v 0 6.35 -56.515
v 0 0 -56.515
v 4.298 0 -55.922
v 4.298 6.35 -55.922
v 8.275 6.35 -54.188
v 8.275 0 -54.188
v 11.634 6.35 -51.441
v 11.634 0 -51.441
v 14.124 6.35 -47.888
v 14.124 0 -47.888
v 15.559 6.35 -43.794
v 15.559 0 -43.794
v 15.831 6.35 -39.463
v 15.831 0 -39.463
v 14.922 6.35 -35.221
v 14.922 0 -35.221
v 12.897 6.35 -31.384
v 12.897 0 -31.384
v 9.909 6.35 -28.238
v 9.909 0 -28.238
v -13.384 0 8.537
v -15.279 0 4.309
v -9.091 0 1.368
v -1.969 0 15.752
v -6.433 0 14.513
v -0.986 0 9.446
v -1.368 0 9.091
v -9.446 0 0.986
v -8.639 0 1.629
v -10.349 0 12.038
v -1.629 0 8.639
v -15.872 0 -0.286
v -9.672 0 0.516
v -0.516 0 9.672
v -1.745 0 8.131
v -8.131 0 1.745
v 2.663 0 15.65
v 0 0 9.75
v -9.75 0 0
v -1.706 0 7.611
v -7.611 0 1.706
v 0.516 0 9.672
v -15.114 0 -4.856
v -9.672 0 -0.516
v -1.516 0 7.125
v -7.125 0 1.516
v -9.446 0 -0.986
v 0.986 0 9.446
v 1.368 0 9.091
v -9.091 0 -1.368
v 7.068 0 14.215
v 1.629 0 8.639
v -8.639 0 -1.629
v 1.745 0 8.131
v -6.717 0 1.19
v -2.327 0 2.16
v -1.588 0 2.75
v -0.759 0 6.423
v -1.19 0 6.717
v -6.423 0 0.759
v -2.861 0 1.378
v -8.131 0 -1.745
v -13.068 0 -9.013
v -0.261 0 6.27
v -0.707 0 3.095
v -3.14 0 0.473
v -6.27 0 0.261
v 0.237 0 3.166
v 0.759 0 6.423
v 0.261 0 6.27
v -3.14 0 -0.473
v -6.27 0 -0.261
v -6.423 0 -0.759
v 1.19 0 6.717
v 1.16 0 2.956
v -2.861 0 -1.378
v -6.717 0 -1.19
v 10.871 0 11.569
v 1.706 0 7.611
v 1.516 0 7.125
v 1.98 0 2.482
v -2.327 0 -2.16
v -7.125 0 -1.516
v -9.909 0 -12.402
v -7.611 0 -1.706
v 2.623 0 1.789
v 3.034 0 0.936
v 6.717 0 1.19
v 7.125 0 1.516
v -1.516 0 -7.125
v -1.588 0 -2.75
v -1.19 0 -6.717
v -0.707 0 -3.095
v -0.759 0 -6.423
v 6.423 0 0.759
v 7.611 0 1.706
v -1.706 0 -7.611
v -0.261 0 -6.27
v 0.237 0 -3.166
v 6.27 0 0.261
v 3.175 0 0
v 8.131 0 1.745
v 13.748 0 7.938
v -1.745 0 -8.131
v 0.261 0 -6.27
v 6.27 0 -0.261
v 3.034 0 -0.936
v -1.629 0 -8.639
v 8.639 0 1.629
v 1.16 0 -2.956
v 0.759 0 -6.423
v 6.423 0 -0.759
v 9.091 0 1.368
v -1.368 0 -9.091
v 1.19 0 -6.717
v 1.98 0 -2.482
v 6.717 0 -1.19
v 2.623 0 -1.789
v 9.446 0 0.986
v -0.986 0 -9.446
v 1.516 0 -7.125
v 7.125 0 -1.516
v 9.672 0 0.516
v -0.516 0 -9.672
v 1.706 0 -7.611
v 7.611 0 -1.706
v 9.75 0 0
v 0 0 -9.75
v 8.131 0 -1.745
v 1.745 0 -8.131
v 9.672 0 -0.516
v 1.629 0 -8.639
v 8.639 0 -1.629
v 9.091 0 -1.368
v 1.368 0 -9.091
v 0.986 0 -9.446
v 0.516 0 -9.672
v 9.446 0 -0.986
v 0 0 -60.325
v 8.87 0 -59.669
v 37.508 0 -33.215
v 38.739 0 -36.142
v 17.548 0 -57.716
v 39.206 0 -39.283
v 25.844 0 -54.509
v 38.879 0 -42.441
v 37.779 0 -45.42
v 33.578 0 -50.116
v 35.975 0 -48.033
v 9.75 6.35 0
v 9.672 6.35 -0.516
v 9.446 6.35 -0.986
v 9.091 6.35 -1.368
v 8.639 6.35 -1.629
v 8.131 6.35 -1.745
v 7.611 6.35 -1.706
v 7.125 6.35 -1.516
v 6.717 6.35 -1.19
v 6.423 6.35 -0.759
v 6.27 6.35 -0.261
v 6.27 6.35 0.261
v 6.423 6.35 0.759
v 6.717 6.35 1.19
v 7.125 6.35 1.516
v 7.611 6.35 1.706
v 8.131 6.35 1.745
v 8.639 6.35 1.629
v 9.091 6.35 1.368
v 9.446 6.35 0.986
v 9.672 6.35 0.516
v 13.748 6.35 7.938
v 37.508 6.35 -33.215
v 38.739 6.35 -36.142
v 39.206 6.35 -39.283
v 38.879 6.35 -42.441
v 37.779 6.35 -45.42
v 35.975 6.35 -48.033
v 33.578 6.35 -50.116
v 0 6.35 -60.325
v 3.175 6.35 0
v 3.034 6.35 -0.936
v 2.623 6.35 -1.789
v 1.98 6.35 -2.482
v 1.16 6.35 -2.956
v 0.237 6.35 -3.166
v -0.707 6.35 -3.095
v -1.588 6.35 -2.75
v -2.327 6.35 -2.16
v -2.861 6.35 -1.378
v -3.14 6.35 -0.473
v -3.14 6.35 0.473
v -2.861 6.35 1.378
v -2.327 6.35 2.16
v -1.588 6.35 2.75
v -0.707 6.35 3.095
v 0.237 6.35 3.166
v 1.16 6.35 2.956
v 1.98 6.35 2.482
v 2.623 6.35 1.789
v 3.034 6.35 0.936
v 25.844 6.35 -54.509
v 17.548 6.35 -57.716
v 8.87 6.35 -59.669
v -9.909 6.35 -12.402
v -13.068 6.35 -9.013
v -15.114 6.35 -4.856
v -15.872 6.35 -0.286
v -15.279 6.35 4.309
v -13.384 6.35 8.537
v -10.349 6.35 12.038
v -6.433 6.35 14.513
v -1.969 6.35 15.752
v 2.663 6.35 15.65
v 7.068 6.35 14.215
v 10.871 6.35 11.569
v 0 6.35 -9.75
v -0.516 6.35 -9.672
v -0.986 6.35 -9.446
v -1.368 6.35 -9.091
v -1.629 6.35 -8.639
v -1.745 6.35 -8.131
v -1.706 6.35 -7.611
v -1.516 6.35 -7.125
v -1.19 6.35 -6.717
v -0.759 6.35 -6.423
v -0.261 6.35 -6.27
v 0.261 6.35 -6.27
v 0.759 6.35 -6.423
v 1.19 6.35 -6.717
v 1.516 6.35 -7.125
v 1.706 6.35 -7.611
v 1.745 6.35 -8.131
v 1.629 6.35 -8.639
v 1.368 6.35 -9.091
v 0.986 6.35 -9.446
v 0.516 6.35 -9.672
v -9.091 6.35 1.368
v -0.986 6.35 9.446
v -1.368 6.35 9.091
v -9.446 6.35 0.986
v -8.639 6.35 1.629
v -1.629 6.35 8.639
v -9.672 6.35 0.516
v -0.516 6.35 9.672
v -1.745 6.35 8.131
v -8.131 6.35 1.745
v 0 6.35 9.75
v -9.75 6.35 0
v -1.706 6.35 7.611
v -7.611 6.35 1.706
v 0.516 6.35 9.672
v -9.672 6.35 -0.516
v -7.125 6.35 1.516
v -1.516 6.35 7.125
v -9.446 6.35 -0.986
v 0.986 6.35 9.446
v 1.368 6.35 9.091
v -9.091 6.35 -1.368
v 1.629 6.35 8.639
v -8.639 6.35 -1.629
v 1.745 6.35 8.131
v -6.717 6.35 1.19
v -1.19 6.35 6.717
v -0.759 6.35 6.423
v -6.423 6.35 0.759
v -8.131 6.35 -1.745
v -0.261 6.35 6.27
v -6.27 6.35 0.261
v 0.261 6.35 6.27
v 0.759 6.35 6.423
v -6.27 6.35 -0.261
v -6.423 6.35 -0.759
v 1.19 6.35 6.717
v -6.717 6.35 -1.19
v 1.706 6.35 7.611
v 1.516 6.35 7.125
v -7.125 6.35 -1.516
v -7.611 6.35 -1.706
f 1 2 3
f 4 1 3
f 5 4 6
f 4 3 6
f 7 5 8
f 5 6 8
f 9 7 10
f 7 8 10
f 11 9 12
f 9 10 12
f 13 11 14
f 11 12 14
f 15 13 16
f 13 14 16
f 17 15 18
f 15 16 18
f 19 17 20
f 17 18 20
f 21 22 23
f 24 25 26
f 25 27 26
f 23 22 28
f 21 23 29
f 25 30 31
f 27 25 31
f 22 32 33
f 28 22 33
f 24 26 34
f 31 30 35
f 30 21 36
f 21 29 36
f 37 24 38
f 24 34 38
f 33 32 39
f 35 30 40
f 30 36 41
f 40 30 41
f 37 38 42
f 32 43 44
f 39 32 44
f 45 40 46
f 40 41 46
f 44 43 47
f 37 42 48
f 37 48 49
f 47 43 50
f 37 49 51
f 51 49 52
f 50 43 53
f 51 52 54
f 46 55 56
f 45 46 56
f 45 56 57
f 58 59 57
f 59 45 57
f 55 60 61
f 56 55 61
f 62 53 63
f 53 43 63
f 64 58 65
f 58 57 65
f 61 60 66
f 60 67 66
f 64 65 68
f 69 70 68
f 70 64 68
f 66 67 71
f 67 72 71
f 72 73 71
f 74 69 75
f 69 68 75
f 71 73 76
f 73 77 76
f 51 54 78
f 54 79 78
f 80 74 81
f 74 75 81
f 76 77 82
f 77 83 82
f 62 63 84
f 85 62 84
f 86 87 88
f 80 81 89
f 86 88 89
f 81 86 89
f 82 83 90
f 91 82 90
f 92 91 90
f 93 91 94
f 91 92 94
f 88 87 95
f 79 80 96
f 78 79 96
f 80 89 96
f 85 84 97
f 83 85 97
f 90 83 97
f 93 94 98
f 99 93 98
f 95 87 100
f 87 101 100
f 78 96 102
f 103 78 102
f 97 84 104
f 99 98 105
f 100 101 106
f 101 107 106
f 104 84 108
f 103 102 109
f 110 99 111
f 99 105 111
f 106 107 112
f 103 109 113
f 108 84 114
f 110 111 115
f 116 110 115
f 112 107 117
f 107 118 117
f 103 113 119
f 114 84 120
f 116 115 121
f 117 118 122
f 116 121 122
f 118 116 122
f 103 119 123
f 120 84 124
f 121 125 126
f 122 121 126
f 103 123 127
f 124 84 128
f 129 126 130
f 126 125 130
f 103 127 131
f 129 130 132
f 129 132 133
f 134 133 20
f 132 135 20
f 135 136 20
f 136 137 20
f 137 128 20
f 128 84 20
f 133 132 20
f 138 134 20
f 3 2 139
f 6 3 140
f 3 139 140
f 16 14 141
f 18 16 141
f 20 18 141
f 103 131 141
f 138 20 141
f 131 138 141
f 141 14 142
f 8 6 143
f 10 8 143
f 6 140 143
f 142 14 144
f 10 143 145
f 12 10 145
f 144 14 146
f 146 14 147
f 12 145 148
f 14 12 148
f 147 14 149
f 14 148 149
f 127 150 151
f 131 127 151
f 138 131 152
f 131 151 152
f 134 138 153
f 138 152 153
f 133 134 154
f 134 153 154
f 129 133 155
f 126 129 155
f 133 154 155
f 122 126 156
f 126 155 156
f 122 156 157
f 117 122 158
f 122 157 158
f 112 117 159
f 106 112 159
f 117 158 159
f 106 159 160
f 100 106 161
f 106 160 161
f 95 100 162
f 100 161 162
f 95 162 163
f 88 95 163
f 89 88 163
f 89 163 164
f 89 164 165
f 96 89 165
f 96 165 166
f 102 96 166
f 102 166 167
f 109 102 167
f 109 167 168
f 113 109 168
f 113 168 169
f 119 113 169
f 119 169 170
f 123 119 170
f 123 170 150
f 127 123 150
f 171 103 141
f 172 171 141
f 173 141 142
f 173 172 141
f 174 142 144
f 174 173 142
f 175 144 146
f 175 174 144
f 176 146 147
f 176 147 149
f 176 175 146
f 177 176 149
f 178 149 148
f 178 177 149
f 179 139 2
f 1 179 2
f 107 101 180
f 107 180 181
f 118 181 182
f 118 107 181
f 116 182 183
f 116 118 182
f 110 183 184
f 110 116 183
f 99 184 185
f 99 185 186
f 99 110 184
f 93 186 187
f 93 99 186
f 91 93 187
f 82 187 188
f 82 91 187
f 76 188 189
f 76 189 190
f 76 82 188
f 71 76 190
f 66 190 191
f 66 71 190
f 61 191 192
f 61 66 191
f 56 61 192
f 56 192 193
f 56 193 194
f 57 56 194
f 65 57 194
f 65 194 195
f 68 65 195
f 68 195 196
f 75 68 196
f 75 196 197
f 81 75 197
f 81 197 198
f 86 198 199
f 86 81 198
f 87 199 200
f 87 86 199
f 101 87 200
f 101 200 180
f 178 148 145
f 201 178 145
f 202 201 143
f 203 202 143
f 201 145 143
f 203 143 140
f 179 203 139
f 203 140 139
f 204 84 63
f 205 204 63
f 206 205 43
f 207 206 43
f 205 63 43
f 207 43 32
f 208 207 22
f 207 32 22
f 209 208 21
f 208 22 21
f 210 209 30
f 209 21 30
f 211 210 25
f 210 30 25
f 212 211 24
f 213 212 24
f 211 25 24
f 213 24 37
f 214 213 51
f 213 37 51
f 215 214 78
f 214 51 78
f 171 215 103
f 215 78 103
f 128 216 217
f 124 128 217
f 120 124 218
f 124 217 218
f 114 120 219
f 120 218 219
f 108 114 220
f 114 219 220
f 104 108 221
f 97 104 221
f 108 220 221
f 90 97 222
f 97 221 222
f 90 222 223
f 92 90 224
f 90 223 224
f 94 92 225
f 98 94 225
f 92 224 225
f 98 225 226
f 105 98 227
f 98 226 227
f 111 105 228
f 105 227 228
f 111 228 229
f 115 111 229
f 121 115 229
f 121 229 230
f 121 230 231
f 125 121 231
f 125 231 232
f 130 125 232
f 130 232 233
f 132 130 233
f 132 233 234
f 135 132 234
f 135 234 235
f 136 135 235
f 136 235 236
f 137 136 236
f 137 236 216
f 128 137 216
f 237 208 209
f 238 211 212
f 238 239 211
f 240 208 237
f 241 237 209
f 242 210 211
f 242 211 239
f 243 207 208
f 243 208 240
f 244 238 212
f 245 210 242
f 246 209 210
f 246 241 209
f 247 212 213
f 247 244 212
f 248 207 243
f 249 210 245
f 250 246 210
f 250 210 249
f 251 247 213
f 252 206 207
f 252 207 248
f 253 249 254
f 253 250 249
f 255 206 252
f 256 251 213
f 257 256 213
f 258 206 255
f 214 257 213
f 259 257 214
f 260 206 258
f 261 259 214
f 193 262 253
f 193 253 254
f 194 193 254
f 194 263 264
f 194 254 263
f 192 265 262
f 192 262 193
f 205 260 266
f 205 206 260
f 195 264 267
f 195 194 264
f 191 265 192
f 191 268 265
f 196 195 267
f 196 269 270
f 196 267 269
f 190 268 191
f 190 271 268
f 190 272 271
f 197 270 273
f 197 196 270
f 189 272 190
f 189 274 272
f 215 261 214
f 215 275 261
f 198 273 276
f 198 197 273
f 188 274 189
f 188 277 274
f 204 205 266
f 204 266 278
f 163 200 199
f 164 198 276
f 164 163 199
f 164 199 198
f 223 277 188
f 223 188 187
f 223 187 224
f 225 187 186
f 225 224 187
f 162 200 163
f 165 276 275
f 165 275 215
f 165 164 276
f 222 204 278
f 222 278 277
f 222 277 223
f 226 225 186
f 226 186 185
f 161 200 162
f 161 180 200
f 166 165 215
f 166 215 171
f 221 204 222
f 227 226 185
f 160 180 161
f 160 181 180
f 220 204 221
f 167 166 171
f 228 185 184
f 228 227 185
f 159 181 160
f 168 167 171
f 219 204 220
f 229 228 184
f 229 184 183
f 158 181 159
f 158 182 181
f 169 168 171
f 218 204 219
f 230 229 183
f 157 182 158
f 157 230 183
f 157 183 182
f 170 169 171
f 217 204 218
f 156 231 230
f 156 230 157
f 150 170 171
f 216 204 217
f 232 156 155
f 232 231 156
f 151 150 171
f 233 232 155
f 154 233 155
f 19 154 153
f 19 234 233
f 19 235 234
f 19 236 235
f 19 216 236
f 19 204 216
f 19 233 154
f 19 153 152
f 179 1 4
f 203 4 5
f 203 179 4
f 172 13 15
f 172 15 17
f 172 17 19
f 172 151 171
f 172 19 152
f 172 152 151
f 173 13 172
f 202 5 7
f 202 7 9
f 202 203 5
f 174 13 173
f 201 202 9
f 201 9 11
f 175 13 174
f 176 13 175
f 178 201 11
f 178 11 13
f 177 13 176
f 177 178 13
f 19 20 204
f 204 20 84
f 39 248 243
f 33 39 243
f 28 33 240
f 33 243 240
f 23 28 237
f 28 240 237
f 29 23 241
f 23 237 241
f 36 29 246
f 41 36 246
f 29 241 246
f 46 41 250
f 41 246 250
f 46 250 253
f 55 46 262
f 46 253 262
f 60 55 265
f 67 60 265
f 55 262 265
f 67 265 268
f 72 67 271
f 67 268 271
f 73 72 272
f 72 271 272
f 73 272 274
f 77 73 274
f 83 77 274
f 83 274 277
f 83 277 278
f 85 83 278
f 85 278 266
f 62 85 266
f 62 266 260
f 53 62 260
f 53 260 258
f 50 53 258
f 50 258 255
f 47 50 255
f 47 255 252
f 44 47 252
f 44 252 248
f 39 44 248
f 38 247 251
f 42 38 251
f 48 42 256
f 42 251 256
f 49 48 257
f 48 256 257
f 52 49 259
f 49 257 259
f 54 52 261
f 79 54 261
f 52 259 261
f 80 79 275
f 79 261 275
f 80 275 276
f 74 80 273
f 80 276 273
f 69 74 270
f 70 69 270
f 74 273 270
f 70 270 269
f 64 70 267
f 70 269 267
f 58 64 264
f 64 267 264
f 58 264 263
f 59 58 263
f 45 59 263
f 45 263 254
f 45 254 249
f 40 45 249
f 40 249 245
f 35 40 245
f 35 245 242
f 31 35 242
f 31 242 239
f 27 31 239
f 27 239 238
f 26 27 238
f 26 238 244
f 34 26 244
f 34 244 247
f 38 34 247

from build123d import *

# Parameters (mm, degrees)
SKETCH1_R           = 3.175
BOSS_EXTRUDE1_DEPTH = 6.35
SKETCH2_R           = 1.75
CUT_EXTRUDE1_DEPTH  = 7.35
CIRPATTERN1_COUNT   = 4
FILLET1_R           = 12.7


with BuildPart() as part:
    # Sketch1 → Boss-Extrude1 (new body)
    with BuildSketch(Plane(origin=(0, 0, 0), x_dir=(1, 0, 0), z_dir=(0, 1, 0))):
        with BuildLine():
            Line((13.748153285, -7.9375), (42.847508948, 42.464062476))
            ThreePointArc((42.847508948, 42.464062476), (23.210569318, 55.681011996), (0, 60.325))
            Line((0, 60.325), (0, 56.515))
            ThreePointArc((0, 56.515), (14.981702707, 45.890162758), (9.909464895, 28.23765625))
            Line((9.909464895, 28.23765625), (-9.909464895, 12.40234375))
            ThreePointArc((-9.909464895, 12.40234375), (-10.349453758, -12.037625676), (13.748153285, -7.9375))
        make_face()
        Circle(SKETCH1_R, mode=Mode.SUBTRACT)
    extrude(amount=BOSS_EXTRUDE1_DEPTH)

    # Sketch2 → Cut-Extrude1 (cut, through all)
    with BuildSketch(Plane(origin=(0, 6.35, 0), x_dir=(1, 0, 0), z_dir=(0, 1, 0))):
        with Locations((8, 0)):
            Circle(SKETCH2_R)
    cut_extrude1 = extrude(amount=-CUT_EXTRUDE1_DEPTH, mode=Mode.SUBTRACT)

    # CirPattern1: Cut-Extrude1 ×4 about axis
    cirpattern1_axis = Axis((0, 0, 0), (0, 1, 0))
    for i in range(1, CIRPATTERN1_COUNT):
        add(cut_extrude1.rotate(cirpattern1_axis, i * 360 / CIRPATTERN1_COUNT), mode=Mode.SUBTRACT)

    # Fillet1
    fillet1_edges = [part.edges().sort_by_distance(p)[0] for p in [
        (42.847508948, 3.175, -42.464062476),
    ]]
    fillet(fillet1_edges, radius=FILLET1_R)


solid = part.part
